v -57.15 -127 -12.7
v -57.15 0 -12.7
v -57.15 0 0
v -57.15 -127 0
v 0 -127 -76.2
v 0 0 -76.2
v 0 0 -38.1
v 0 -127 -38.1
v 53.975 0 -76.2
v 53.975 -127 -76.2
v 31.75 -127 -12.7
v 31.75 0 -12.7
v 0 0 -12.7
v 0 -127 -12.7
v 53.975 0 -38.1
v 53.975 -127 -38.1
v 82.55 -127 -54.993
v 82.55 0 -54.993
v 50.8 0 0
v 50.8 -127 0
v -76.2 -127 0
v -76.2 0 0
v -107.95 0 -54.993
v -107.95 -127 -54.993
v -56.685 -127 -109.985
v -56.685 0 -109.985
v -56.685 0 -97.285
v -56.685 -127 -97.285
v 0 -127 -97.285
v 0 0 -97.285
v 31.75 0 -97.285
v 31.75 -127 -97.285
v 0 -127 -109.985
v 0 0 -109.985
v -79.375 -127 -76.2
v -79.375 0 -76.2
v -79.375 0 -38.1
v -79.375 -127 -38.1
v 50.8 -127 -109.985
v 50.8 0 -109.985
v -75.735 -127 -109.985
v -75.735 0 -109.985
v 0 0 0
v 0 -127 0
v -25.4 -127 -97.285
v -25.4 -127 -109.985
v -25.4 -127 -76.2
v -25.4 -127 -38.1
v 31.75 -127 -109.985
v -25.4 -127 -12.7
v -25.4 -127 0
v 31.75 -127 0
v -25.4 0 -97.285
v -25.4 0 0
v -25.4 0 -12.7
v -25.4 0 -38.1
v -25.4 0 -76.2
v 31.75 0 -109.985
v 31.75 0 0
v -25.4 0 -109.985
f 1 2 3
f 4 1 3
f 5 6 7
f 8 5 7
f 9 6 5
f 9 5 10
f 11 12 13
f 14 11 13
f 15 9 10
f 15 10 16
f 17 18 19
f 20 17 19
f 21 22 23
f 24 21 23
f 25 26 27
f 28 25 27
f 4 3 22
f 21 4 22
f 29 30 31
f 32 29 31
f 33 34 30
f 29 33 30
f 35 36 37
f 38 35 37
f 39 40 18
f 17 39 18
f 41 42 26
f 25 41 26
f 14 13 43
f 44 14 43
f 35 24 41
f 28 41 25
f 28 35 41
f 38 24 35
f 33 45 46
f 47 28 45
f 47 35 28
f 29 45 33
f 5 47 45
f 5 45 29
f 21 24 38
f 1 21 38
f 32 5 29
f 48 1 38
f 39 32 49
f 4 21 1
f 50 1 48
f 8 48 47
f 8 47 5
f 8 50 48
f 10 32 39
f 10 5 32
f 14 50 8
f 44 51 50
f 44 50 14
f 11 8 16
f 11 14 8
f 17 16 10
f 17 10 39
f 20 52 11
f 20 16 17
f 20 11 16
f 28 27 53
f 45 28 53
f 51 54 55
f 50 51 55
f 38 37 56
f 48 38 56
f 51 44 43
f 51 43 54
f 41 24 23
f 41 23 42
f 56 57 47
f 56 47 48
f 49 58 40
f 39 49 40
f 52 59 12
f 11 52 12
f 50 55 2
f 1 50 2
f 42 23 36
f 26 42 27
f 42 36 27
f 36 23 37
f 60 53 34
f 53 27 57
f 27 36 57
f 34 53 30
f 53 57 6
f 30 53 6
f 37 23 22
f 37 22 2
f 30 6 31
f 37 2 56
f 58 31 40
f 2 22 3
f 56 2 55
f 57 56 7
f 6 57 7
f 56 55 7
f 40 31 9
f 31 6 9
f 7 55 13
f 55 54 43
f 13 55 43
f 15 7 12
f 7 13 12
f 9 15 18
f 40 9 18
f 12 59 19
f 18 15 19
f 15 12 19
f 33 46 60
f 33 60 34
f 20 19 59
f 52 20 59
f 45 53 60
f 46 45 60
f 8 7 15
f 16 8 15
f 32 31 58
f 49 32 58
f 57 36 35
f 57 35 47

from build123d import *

# Parameters (mm, degrees)
F0_W     = 53.975
F0_H     = 38.1
F1_DEPTH = 127


with BuildPart() as f1:
    # F0 (on Front) → F1 (new body)
    with BuildSketch(Plane.XZ):
        Polygon((0, -12.7), (0, 0), (-25.4, 0), (-25.4, -12.7), (-57.15, -12.7), (-57.15, 0), (-76.2, 0), (-107.95, -54.992613), (-75.735204, -109.985226), (-56.685204, -109.985226), (-56.685204, -97.285226), (-25.4, -97.285226), (-25.4, -109.985226), (0, -109.985226), (0, -97.285226), (31.75, -97.285226), (31.75, -109.985226), (50.8, -109.985226), (82.55, -54.992613), (50.8, 0), (31.75, 0), (31.75, -12.7), align=None)
        with Locations((-52.3875, -57.15)):
            Rectangle(F0_W, F0_H, mode=Mode.SUBTRACT)
        with Locations((26.9875, -57.15)):
            Rectangle(F0_W, F0_H, mode=Mode.SUBTRACT)
    extrude(amount=F1_DEPTH)


solid = f1.part
